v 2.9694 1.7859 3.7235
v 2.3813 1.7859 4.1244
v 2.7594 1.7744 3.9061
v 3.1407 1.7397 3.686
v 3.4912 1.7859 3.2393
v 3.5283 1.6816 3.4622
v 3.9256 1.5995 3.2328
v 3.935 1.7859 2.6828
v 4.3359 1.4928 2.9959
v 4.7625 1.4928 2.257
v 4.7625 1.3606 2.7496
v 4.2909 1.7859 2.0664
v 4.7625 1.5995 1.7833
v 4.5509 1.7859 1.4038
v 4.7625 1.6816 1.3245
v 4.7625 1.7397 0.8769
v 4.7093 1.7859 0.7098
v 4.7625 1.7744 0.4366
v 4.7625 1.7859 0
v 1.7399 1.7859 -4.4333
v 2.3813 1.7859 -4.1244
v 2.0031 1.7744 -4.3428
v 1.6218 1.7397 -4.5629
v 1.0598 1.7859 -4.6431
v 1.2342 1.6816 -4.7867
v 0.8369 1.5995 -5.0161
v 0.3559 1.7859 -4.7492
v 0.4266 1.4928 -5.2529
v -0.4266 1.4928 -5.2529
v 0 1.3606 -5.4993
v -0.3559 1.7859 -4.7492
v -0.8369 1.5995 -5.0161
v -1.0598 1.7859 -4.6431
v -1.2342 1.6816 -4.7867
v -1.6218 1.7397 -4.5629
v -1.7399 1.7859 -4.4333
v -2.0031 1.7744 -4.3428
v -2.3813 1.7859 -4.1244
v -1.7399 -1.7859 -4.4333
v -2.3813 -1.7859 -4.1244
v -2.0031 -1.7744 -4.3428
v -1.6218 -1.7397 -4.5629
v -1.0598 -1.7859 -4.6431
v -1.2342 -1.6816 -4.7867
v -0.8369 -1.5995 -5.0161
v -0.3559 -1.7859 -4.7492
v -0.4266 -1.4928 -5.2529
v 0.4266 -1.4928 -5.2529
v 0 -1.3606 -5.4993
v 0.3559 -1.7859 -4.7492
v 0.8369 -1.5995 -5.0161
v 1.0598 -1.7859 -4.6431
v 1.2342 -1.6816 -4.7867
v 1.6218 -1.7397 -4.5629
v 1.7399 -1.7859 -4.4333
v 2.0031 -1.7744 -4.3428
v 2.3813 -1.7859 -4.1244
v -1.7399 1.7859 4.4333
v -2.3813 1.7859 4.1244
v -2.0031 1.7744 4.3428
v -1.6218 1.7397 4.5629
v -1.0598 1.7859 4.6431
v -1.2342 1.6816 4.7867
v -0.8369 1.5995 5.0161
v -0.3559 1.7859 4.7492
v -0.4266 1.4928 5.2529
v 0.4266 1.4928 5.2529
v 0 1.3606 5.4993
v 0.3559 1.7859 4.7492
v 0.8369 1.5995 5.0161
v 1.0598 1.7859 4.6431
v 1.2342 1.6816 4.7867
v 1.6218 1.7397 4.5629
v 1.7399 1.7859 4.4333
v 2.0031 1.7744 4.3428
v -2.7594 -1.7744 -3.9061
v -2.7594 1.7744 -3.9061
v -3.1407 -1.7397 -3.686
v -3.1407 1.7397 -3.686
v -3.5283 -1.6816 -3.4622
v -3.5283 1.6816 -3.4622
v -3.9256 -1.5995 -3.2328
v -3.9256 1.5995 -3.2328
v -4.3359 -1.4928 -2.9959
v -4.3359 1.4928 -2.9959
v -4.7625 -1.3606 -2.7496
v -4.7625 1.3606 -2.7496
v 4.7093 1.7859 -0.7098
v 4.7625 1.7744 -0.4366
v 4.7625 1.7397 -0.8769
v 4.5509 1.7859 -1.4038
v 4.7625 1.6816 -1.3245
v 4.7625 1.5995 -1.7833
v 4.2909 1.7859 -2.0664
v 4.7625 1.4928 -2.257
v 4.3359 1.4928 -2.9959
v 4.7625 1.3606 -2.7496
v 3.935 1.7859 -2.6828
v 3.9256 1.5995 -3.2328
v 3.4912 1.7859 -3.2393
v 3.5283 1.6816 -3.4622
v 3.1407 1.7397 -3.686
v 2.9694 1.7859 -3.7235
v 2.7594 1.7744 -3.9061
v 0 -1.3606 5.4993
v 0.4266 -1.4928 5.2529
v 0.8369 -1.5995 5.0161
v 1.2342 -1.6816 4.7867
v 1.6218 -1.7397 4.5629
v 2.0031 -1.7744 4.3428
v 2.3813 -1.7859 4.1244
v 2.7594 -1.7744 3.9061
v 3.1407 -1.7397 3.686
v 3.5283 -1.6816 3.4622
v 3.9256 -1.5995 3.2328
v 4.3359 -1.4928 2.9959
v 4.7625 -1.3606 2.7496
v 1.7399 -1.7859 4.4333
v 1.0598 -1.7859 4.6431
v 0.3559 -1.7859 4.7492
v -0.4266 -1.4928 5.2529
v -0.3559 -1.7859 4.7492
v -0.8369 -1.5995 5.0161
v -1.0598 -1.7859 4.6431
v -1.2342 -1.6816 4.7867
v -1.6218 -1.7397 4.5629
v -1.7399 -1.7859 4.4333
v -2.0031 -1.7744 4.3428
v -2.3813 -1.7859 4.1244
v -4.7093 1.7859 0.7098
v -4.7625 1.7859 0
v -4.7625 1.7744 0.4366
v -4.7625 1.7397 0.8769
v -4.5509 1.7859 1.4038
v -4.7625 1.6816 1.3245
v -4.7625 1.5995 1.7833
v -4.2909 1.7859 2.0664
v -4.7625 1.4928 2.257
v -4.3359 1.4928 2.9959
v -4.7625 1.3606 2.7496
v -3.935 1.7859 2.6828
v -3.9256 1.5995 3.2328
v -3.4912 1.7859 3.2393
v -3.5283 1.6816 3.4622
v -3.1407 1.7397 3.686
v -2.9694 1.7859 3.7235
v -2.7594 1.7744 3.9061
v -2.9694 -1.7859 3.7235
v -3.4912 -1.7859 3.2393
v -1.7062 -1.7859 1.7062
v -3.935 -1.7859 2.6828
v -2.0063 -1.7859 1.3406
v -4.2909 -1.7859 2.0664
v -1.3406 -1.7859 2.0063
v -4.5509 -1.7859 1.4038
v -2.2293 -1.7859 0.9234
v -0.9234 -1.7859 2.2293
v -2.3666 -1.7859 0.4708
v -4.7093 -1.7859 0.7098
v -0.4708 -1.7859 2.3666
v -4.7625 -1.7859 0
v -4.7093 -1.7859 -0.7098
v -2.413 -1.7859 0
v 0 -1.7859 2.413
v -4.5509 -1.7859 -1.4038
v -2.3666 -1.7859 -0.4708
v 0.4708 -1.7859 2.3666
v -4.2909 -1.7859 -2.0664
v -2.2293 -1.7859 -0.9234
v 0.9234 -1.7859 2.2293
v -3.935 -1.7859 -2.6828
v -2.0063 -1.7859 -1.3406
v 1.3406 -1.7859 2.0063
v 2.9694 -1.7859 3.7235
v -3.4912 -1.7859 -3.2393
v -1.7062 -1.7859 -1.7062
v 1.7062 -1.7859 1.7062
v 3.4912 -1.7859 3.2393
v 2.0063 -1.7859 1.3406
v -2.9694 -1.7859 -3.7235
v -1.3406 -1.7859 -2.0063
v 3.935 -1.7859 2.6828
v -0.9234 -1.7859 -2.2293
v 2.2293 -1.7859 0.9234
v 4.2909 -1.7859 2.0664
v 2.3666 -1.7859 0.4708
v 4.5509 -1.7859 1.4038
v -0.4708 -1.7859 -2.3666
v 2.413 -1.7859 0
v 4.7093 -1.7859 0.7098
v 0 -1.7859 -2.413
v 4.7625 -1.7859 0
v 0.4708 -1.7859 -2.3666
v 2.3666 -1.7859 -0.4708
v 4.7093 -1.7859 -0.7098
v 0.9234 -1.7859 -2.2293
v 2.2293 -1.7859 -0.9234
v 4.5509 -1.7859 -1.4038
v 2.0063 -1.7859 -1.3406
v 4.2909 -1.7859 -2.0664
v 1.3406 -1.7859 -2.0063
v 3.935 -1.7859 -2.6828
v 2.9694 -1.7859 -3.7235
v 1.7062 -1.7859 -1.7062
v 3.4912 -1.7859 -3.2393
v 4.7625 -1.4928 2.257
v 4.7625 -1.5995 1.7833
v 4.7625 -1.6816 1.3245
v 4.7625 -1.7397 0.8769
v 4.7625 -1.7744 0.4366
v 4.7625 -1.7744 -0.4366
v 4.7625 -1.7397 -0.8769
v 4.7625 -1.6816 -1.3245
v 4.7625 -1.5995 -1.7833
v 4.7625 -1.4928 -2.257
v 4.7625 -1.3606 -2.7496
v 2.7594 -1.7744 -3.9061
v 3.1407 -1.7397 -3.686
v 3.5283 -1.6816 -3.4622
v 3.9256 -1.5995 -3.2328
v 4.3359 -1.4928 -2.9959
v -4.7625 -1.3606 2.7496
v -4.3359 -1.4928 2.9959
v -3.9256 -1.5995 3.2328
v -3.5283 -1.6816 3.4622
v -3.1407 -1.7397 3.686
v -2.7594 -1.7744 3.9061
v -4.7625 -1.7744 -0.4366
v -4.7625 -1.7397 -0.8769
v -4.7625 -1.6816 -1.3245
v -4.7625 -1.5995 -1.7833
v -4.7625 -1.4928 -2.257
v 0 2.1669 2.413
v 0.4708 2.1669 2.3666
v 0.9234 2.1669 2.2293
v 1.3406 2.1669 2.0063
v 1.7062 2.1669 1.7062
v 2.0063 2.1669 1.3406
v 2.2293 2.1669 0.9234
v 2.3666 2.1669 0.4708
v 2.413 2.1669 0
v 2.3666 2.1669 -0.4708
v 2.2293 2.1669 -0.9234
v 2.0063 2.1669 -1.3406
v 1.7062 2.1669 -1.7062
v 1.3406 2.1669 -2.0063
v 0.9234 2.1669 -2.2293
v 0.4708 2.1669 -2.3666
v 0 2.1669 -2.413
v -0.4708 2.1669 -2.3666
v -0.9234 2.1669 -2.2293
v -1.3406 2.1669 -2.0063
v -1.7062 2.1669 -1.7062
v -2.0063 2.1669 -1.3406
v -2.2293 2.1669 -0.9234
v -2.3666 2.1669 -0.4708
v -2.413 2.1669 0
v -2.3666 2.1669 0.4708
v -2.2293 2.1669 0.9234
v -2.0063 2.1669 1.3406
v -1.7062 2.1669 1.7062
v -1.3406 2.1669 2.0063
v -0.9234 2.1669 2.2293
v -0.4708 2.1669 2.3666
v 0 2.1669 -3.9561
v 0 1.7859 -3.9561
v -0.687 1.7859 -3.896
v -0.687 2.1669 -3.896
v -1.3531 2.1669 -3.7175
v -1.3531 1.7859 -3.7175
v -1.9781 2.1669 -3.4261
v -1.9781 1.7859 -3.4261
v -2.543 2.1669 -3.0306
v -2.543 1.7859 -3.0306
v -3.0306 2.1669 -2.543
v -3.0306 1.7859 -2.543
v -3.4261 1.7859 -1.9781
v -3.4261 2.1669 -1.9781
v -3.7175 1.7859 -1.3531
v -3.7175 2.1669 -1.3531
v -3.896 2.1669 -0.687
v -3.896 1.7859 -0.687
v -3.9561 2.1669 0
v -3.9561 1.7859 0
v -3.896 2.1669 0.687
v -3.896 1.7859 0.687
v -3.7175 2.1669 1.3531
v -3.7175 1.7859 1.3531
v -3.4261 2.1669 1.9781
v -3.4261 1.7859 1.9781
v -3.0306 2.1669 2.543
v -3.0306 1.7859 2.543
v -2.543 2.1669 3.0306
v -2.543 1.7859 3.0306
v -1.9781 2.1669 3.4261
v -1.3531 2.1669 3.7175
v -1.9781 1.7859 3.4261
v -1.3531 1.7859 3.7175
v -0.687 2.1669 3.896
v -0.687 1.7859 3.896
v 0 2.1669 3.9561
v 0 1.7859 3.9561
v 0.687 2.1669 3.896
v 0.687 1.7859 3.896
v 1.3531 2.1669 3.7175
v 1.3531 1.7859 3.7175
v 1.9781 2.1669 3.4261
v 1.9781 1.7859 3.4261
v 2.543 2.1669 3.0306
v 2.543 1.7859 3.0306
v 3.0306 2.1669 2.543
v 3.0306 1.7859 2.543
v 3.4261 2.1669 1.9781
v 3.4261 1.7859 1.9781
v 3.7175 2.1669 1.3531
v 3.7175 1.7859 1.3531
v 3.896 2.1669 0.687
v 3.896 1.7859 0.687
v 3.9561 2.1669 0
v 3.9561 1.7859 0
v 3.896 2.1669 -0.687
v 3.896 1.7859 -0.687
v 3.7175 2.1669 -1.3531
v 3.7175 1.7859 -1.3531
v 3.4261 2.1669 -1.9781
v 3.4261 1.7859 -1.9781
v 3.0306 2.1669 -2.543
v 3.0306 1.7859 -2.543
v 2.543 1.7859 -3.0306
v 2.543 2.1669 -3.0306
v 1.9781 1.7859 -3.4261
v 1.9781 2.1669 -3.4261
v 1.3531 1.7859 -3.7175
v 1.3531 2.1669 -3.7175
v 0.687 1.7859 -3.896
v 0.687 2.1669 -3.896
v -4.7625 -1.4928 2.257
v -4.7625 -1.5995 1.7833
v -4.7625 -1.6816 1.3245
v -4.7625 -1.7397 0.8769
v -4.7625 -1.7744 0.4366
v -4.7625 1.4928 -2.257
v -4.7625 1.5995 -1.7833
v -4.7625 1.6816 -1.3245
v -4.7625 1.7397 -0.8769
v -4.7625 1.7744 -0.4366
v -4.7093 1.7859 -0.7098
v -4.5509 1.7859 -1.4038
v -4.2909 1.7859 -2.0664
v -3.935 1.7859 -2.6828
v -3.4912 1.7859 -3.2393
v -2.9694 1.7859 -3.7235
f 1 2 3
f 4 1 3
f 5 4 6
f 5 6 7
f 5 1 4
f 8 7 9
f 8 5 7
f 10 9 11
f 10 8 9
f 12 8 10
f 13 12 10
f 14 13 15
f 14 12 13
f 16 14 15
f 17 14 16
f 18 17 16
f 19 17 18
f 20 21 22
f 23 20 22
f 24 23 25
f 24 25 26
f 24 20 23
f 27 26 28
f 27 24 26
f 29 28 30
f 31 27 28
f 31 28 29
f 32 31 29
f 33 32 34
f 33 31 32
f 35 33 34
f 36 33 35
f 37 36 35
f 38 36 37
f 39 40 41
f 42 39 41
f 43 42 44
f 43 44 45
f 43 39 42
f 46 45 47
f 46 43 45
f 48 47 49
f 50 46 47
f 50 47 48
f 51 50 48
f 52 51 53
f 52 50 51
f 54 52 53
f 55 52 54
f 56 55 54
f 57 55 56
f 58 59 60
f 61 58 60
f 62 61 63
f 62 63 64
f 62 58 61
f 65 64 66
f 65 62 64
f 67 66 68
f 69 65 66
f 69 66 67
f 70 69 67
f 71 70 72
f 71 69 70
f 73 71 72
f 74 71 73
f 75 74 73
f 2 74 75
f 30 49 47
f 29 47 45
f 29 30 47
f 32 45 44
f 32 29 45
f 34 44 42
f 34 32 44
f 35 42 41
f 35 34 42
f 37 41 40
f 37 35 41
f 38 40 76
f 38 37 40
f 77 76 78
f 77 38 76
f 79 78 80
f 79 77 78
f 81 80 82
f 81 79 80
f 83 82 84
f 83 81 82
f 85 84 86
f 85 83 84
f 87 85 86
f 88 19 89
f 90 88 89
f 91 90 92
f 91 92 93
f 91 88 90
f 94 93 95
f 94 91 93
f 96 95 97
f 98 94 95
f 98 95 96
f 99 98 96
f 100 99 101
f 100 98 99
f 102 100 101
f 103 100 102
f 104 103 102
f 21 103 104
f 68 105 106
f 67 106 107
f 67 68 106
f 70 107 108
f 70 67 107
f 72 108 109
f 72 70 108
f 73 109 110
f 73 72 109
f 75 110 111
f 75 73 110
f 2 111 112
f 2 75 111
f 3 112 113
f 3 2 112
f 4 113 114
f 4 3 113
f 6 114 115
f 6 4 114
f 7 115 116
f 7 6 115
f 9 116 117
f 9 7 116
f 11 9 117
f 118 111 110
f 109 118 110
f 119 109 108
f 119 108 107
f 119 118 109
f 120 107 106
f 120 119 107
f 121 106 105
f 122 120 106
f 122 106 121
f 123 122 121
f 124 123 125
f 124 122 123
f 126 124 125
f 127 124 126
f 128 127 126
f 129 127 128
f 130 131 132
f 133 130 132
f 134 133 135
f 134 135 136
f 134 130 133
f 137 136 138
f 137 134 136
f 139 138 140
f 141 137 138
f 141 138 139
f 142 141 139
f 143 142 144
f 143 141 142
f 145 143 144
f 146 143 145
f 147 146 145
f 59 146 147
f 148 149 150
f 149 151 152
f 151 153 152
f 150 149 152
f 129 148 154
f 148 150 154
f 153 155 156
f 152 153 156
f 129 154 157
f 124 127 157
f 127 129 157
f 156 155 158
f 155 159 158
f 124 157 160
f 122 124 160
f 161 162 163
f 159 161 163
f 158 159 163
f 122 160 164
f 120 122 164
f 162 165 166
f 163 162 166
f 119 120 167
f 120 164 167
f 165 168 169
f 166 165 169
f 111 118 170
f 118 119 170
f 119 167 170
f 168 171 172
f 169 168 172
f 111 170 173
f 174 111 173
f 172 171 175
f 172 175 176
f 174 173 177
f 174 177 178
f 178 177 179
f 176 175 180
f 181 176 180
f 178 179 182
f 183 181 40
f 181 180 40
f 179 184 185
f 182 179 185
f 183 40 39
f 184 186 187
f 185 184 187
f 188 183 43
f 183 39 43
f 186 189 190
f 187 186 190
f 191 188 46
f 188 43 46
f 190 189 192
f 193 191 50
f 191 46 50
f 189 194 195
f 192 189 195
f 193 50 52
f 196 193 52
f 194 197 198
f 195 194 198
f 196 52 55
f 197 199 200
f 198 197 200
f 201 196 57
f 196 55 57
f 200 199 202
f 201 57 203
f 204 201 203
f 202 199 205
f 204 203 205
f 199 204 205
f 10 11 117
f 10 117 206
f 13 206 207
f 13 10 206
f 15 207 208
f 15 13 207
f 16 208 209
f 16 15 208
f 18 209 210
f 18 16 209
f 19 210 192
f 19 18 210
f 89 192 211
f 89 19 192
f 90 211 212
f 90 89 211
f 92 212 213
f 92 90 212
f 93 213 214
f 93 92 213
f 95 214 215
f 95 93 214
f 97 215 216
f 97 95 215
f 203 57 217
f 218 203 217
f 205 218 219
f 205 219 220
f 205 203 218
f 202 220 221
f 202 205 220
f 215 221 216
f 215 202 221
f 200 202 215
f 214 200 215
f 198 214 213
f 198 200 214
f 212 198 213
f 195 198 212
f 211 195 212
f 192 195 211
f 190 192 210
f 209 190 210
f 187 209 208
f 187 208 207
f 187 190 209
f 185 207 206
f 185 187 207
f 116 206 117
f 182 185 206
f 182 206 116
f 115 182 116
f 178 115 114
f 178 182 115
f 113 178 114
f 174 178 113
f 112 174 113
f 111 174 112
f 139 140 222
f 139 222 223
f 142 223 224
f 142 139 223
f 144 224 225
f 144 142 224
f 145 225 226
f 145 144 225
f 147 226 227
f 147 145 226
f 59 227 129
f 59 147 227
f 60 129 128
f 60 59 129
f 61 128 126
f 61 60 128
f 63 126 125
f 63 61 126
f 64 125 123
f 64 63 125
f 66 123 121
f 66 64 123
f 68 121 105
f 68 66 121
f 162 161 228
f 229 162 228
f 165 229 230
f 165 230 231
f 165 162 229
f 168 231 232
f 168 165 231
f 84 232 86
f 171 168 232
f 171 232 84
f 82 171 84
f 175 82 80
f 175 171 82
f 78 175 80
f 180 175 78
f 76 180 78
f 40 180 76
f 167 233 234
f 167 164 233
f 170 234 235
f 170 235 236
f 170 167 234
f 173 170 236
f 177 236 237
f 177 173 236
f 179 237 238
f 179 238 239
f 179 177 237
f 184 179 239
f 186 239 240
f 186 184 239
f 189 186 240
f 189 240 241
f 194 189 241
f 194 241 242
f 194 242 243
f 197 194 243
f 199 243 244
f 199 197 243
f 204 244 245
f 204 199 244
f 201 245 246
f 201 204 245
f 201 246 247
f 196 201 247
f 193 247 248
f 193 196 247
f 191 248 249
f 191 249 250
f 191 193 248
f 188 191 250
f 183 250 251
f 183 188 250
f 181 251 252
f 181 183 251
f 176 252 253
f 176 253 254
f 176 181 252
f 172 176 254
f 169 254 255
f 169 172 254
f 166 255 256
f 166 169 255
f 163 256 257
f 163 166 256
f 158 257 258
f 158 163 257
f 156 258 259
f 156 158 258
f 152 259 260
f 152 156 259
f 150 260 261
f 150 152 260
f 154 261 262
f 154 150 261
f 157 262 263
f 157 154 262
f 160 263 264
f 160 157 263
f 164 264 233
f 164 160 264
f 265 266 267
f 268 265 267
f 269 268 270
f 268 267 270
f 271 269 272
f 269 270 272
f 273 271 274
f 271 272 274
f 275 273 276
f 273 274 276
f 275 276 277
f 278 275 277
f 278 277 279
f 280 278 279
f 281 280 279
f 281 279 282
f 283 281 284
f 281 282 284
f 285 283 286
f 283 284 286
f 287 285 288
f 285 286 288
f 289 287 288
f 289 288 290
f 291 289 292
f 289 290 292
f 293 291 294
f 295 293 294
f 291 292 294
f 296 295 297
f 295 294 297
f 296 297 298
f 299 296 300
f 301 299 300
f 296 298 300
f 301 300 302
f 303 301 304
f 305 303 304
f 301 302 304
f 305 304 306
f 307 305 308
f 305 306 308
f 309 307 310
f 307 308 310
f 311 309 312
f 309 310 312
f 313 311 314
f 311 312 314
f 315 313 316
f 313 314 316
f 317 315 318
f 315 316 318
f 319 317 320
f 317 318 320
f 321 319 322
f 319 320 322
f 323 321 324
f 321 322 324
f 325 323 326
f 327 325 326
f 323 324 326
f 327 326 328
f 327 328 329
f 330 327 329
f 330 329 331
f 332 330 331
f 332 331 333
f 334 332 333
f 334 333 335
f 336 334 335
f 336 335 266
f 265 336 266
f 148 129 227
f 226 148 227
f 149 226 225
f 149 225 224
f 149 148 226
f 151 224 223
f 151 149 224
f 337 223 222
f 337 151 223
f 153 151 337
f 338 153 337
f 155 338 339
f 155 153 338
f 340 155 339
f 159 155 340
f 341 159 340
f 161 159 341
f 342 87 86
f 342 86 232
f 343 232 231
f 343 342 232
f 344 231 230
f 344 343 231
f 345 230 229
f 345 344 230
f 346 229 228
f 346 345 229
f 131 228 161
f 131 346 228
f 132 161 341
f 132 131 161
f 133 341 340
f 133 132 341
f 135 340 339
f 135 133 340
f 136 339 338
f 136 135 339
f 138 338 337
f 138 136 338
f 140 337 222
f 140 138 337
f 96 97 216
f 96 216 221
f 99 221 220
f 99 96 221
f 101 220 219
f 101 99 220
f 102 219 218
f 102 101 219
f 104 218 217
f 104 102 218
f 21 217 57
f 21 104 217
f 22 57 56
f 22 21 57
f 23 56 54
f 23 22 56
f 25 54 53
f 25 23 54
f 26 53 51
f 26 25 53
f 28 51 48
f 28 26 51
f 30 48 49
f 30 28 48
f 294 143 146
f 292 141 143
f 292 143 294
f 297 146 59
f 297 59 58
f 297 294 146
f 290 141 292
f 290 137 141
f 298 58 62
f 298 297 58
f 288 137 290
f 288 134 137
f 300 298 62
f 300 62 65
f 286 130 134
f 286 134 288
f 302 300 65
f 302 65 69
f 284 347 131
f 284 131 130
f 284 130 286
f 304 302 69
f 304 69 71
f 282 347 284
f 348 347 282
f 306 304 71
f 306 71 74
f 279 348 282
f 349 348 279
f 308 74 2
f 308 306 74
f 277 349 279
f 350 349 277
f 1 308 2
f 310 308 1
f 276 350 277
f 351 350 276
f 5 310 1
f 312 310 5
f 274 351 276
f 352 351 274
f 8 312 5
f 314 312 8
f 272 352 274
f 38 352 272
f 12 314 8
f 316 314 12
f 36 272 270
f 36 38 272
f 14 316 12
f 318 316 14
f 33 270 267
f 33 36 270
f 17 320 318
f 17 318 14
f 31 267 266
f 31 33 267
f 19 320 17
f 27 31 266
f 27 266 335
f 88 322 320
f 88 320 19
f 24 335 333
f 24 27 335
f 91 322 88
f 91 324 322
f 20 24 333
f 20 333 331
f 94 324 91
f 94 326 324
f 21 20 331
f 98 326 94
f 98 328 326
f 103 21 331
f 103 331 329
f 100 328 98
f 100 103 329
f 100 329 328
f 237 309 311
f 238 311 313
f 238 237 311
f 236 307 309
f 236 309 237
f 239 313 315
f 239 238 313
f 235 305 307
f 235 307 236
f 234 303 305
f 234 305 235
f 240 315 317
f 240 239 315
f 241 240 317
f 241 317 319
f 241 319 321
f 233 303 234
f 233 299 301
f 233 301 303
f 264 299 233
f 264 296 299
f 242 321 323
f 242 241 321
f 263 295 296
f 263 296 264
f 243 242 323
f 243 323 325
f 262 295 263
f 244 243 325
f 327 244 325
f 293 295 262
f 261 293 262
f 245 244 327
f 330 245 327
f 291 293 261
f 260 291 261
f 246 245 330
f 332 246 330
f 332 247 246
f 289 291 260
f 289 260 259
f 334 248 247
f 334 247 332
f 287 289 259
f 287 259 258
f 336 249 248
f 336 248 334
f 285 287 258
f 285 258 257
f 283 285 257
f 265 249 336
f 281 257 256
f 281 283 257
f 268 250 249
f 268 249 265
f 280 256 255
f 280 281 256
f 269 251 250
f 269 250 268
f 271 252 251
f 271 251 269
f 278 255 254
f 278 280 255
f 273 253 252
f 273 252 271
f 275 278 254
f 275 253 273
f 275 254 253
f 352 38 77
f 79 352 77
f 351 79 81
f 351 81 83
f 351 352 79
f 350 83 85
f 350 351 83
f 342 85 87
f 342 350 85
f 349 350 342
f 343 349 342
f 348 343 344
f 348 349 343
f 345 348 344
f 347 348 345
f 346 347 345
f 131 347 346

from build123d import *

# Parameters (mm, degrees)
SKETCH1_R               = 2.413
BOSS_EXTRUDE1_DEPTH     = 1.7859375
SKETCH6_R               = 3.956130657
SKETCH6_R_2             = 2.413
BOSS_EXTRUDE2_DEPTH     = 0.381
SKETCH5_OUTSIDE_W       = 46.08
SKETCH5_OUTSIDE_H       = 47.552
SKETCH5_OUTSIDE_R       = 4.7625
CUT_EXTRUDE2_DEPTH      = 9.104416837
CUT_EXTRUDE2_DRAFT      = -60
MIRROR1_COPY_1_SKETCH_W = 46.08
MIRROR1_COPY_1_SKETCH_H = 47.552
MIRROR1_COPY_1_SKETCH_R = 4.7625
MIRROR1_COPY_1_DEPTH    = 9.104416837
MIRROR1_COPY_1_DRAFT    = -60


with BuildPart() as part:
    # Sketch1 → Boss-Extrude1 (new, symmetric)
    with BuildSketch(Plane(origin=(0, 0, 0), x_dir=(1, 0, 0), z_dir=(0, 1, 0))):
        Polygon((-4.7625, 2.749630657), (-4.7625, -2.749630657), (0, -5.499261314), (4.7625, -2.749630657), (4.7625, 2.749630657), (0, 5.499261314), align=None)
        Circle(SKETCH1_R, mode=Mode.SUBTRACT)
    extrude(amount=BOSS_EXTRUDE1_DEPTH, both=True)

    # Sketch6 → Boss-Extrude2 (add)
    with BuildSketch(Plane(origin=(0, 1.7859375, 0), x_dir=(1, 0, 0), z_dir=(0, 1, 0))):
        Circle(SKETCH6_R)
        Circle(SKETCH6_R_2, mode=Mode.SUBTRACT)
    extrude(amount=BOSS_EXTRUDE2_DEPTH)


with BuildPart() as cut_extrude2_tool:
    # Sketch5 outside → Cut-Extrude2 (with draft: the straight prism first)
    with BuildSketch(Plane(origin=(0, 1.7859375, 0), x_dir=(1, 0, 0), z_dir=(0, 1, 0))):
        Rectangle(SKETCH5_OUTSIDE_W, SKETCH5_OUTSIDE_H)
        Circle(SKETCH5_OUTSIDE_R, mode=Mode.SUBTRACT)
    extrude(amount=-CUT_EXTRUDE2_DEPTH)
    # Cut-Extrude2: the draft: its side faces are tilted about the plane it starts from
    cut_extrude2_sides = [cut_extrude2_tool.faces().sort_by_distance(p)[0] for p in [
        (0, -2.766270918, 23.776),
        (23.04, -2.766270918, 0),
        (0, -2.766270918, -23.776),
        (-23.04, -2.766270918, 0),
        (-4.7625, -2.766270918, 0),
    ]]
    draft(cut_extrude2_sides, Plane(origin=(0, 1.7859375, 0), x_dir=(1, 0, 0), z_dir=(0, 1, 0)), CUT_EXTRUDE2_DRAFT)


with BuildPart() as part_1:
    add(part.part)

    # Cut-Extrude2: cut by cut_extrude2_tool
    add(cut_extrude2_tool.part, mode=Mode.SUBTRACT)


with BuildPart() as mirror1_copy_1_tool:
    # Mirror1 copy 1 sketch → Mirror1 copy 1 (with draft: the straight prism first)
    with BuildSketch(Plane.XZ.offset(1.7859375)):
        Rectangle(MIRROR1_COPY_1_SKETCH_W, MIRROR1_COPY_1_SKETCH_H)
        Circle(MIRROR1_COPY_1_SKETCH_R, mode=Mode.SUBTRACT)
    extrude(amount=-MIRROR1_COPY_1_DEPTH)
    # Mirror1 copy 1: the draft: its side faces are tilted about the plane it starts from
    mirror1_copy_1_sides = [mirror1_copy_1_tool.faces().sort_by_distance(p)[0] for p in [
        (0, 2.766270918, 23.776),
        (23.04, 2.766270918, 0),
        (0, 2.766270918, -23.776),
        (-23.04, 2.766270918, 0),
        (-4.7625, 2.766270918, 0),
    ]]
    draft(mirror1_copy_1_sides, Plane.XZ.offset(1.7859375), MIRROR1_COPY_1_DRAFT)


with BuildPart() as part_2:
    add(part_1.part)

    # Mirror1 copy 1: cut by mirror1_copy_1_tool
    add(mirror1_copy_1_tool.part, mode=Mode.SUBTRACT)


solid = part_2.part
